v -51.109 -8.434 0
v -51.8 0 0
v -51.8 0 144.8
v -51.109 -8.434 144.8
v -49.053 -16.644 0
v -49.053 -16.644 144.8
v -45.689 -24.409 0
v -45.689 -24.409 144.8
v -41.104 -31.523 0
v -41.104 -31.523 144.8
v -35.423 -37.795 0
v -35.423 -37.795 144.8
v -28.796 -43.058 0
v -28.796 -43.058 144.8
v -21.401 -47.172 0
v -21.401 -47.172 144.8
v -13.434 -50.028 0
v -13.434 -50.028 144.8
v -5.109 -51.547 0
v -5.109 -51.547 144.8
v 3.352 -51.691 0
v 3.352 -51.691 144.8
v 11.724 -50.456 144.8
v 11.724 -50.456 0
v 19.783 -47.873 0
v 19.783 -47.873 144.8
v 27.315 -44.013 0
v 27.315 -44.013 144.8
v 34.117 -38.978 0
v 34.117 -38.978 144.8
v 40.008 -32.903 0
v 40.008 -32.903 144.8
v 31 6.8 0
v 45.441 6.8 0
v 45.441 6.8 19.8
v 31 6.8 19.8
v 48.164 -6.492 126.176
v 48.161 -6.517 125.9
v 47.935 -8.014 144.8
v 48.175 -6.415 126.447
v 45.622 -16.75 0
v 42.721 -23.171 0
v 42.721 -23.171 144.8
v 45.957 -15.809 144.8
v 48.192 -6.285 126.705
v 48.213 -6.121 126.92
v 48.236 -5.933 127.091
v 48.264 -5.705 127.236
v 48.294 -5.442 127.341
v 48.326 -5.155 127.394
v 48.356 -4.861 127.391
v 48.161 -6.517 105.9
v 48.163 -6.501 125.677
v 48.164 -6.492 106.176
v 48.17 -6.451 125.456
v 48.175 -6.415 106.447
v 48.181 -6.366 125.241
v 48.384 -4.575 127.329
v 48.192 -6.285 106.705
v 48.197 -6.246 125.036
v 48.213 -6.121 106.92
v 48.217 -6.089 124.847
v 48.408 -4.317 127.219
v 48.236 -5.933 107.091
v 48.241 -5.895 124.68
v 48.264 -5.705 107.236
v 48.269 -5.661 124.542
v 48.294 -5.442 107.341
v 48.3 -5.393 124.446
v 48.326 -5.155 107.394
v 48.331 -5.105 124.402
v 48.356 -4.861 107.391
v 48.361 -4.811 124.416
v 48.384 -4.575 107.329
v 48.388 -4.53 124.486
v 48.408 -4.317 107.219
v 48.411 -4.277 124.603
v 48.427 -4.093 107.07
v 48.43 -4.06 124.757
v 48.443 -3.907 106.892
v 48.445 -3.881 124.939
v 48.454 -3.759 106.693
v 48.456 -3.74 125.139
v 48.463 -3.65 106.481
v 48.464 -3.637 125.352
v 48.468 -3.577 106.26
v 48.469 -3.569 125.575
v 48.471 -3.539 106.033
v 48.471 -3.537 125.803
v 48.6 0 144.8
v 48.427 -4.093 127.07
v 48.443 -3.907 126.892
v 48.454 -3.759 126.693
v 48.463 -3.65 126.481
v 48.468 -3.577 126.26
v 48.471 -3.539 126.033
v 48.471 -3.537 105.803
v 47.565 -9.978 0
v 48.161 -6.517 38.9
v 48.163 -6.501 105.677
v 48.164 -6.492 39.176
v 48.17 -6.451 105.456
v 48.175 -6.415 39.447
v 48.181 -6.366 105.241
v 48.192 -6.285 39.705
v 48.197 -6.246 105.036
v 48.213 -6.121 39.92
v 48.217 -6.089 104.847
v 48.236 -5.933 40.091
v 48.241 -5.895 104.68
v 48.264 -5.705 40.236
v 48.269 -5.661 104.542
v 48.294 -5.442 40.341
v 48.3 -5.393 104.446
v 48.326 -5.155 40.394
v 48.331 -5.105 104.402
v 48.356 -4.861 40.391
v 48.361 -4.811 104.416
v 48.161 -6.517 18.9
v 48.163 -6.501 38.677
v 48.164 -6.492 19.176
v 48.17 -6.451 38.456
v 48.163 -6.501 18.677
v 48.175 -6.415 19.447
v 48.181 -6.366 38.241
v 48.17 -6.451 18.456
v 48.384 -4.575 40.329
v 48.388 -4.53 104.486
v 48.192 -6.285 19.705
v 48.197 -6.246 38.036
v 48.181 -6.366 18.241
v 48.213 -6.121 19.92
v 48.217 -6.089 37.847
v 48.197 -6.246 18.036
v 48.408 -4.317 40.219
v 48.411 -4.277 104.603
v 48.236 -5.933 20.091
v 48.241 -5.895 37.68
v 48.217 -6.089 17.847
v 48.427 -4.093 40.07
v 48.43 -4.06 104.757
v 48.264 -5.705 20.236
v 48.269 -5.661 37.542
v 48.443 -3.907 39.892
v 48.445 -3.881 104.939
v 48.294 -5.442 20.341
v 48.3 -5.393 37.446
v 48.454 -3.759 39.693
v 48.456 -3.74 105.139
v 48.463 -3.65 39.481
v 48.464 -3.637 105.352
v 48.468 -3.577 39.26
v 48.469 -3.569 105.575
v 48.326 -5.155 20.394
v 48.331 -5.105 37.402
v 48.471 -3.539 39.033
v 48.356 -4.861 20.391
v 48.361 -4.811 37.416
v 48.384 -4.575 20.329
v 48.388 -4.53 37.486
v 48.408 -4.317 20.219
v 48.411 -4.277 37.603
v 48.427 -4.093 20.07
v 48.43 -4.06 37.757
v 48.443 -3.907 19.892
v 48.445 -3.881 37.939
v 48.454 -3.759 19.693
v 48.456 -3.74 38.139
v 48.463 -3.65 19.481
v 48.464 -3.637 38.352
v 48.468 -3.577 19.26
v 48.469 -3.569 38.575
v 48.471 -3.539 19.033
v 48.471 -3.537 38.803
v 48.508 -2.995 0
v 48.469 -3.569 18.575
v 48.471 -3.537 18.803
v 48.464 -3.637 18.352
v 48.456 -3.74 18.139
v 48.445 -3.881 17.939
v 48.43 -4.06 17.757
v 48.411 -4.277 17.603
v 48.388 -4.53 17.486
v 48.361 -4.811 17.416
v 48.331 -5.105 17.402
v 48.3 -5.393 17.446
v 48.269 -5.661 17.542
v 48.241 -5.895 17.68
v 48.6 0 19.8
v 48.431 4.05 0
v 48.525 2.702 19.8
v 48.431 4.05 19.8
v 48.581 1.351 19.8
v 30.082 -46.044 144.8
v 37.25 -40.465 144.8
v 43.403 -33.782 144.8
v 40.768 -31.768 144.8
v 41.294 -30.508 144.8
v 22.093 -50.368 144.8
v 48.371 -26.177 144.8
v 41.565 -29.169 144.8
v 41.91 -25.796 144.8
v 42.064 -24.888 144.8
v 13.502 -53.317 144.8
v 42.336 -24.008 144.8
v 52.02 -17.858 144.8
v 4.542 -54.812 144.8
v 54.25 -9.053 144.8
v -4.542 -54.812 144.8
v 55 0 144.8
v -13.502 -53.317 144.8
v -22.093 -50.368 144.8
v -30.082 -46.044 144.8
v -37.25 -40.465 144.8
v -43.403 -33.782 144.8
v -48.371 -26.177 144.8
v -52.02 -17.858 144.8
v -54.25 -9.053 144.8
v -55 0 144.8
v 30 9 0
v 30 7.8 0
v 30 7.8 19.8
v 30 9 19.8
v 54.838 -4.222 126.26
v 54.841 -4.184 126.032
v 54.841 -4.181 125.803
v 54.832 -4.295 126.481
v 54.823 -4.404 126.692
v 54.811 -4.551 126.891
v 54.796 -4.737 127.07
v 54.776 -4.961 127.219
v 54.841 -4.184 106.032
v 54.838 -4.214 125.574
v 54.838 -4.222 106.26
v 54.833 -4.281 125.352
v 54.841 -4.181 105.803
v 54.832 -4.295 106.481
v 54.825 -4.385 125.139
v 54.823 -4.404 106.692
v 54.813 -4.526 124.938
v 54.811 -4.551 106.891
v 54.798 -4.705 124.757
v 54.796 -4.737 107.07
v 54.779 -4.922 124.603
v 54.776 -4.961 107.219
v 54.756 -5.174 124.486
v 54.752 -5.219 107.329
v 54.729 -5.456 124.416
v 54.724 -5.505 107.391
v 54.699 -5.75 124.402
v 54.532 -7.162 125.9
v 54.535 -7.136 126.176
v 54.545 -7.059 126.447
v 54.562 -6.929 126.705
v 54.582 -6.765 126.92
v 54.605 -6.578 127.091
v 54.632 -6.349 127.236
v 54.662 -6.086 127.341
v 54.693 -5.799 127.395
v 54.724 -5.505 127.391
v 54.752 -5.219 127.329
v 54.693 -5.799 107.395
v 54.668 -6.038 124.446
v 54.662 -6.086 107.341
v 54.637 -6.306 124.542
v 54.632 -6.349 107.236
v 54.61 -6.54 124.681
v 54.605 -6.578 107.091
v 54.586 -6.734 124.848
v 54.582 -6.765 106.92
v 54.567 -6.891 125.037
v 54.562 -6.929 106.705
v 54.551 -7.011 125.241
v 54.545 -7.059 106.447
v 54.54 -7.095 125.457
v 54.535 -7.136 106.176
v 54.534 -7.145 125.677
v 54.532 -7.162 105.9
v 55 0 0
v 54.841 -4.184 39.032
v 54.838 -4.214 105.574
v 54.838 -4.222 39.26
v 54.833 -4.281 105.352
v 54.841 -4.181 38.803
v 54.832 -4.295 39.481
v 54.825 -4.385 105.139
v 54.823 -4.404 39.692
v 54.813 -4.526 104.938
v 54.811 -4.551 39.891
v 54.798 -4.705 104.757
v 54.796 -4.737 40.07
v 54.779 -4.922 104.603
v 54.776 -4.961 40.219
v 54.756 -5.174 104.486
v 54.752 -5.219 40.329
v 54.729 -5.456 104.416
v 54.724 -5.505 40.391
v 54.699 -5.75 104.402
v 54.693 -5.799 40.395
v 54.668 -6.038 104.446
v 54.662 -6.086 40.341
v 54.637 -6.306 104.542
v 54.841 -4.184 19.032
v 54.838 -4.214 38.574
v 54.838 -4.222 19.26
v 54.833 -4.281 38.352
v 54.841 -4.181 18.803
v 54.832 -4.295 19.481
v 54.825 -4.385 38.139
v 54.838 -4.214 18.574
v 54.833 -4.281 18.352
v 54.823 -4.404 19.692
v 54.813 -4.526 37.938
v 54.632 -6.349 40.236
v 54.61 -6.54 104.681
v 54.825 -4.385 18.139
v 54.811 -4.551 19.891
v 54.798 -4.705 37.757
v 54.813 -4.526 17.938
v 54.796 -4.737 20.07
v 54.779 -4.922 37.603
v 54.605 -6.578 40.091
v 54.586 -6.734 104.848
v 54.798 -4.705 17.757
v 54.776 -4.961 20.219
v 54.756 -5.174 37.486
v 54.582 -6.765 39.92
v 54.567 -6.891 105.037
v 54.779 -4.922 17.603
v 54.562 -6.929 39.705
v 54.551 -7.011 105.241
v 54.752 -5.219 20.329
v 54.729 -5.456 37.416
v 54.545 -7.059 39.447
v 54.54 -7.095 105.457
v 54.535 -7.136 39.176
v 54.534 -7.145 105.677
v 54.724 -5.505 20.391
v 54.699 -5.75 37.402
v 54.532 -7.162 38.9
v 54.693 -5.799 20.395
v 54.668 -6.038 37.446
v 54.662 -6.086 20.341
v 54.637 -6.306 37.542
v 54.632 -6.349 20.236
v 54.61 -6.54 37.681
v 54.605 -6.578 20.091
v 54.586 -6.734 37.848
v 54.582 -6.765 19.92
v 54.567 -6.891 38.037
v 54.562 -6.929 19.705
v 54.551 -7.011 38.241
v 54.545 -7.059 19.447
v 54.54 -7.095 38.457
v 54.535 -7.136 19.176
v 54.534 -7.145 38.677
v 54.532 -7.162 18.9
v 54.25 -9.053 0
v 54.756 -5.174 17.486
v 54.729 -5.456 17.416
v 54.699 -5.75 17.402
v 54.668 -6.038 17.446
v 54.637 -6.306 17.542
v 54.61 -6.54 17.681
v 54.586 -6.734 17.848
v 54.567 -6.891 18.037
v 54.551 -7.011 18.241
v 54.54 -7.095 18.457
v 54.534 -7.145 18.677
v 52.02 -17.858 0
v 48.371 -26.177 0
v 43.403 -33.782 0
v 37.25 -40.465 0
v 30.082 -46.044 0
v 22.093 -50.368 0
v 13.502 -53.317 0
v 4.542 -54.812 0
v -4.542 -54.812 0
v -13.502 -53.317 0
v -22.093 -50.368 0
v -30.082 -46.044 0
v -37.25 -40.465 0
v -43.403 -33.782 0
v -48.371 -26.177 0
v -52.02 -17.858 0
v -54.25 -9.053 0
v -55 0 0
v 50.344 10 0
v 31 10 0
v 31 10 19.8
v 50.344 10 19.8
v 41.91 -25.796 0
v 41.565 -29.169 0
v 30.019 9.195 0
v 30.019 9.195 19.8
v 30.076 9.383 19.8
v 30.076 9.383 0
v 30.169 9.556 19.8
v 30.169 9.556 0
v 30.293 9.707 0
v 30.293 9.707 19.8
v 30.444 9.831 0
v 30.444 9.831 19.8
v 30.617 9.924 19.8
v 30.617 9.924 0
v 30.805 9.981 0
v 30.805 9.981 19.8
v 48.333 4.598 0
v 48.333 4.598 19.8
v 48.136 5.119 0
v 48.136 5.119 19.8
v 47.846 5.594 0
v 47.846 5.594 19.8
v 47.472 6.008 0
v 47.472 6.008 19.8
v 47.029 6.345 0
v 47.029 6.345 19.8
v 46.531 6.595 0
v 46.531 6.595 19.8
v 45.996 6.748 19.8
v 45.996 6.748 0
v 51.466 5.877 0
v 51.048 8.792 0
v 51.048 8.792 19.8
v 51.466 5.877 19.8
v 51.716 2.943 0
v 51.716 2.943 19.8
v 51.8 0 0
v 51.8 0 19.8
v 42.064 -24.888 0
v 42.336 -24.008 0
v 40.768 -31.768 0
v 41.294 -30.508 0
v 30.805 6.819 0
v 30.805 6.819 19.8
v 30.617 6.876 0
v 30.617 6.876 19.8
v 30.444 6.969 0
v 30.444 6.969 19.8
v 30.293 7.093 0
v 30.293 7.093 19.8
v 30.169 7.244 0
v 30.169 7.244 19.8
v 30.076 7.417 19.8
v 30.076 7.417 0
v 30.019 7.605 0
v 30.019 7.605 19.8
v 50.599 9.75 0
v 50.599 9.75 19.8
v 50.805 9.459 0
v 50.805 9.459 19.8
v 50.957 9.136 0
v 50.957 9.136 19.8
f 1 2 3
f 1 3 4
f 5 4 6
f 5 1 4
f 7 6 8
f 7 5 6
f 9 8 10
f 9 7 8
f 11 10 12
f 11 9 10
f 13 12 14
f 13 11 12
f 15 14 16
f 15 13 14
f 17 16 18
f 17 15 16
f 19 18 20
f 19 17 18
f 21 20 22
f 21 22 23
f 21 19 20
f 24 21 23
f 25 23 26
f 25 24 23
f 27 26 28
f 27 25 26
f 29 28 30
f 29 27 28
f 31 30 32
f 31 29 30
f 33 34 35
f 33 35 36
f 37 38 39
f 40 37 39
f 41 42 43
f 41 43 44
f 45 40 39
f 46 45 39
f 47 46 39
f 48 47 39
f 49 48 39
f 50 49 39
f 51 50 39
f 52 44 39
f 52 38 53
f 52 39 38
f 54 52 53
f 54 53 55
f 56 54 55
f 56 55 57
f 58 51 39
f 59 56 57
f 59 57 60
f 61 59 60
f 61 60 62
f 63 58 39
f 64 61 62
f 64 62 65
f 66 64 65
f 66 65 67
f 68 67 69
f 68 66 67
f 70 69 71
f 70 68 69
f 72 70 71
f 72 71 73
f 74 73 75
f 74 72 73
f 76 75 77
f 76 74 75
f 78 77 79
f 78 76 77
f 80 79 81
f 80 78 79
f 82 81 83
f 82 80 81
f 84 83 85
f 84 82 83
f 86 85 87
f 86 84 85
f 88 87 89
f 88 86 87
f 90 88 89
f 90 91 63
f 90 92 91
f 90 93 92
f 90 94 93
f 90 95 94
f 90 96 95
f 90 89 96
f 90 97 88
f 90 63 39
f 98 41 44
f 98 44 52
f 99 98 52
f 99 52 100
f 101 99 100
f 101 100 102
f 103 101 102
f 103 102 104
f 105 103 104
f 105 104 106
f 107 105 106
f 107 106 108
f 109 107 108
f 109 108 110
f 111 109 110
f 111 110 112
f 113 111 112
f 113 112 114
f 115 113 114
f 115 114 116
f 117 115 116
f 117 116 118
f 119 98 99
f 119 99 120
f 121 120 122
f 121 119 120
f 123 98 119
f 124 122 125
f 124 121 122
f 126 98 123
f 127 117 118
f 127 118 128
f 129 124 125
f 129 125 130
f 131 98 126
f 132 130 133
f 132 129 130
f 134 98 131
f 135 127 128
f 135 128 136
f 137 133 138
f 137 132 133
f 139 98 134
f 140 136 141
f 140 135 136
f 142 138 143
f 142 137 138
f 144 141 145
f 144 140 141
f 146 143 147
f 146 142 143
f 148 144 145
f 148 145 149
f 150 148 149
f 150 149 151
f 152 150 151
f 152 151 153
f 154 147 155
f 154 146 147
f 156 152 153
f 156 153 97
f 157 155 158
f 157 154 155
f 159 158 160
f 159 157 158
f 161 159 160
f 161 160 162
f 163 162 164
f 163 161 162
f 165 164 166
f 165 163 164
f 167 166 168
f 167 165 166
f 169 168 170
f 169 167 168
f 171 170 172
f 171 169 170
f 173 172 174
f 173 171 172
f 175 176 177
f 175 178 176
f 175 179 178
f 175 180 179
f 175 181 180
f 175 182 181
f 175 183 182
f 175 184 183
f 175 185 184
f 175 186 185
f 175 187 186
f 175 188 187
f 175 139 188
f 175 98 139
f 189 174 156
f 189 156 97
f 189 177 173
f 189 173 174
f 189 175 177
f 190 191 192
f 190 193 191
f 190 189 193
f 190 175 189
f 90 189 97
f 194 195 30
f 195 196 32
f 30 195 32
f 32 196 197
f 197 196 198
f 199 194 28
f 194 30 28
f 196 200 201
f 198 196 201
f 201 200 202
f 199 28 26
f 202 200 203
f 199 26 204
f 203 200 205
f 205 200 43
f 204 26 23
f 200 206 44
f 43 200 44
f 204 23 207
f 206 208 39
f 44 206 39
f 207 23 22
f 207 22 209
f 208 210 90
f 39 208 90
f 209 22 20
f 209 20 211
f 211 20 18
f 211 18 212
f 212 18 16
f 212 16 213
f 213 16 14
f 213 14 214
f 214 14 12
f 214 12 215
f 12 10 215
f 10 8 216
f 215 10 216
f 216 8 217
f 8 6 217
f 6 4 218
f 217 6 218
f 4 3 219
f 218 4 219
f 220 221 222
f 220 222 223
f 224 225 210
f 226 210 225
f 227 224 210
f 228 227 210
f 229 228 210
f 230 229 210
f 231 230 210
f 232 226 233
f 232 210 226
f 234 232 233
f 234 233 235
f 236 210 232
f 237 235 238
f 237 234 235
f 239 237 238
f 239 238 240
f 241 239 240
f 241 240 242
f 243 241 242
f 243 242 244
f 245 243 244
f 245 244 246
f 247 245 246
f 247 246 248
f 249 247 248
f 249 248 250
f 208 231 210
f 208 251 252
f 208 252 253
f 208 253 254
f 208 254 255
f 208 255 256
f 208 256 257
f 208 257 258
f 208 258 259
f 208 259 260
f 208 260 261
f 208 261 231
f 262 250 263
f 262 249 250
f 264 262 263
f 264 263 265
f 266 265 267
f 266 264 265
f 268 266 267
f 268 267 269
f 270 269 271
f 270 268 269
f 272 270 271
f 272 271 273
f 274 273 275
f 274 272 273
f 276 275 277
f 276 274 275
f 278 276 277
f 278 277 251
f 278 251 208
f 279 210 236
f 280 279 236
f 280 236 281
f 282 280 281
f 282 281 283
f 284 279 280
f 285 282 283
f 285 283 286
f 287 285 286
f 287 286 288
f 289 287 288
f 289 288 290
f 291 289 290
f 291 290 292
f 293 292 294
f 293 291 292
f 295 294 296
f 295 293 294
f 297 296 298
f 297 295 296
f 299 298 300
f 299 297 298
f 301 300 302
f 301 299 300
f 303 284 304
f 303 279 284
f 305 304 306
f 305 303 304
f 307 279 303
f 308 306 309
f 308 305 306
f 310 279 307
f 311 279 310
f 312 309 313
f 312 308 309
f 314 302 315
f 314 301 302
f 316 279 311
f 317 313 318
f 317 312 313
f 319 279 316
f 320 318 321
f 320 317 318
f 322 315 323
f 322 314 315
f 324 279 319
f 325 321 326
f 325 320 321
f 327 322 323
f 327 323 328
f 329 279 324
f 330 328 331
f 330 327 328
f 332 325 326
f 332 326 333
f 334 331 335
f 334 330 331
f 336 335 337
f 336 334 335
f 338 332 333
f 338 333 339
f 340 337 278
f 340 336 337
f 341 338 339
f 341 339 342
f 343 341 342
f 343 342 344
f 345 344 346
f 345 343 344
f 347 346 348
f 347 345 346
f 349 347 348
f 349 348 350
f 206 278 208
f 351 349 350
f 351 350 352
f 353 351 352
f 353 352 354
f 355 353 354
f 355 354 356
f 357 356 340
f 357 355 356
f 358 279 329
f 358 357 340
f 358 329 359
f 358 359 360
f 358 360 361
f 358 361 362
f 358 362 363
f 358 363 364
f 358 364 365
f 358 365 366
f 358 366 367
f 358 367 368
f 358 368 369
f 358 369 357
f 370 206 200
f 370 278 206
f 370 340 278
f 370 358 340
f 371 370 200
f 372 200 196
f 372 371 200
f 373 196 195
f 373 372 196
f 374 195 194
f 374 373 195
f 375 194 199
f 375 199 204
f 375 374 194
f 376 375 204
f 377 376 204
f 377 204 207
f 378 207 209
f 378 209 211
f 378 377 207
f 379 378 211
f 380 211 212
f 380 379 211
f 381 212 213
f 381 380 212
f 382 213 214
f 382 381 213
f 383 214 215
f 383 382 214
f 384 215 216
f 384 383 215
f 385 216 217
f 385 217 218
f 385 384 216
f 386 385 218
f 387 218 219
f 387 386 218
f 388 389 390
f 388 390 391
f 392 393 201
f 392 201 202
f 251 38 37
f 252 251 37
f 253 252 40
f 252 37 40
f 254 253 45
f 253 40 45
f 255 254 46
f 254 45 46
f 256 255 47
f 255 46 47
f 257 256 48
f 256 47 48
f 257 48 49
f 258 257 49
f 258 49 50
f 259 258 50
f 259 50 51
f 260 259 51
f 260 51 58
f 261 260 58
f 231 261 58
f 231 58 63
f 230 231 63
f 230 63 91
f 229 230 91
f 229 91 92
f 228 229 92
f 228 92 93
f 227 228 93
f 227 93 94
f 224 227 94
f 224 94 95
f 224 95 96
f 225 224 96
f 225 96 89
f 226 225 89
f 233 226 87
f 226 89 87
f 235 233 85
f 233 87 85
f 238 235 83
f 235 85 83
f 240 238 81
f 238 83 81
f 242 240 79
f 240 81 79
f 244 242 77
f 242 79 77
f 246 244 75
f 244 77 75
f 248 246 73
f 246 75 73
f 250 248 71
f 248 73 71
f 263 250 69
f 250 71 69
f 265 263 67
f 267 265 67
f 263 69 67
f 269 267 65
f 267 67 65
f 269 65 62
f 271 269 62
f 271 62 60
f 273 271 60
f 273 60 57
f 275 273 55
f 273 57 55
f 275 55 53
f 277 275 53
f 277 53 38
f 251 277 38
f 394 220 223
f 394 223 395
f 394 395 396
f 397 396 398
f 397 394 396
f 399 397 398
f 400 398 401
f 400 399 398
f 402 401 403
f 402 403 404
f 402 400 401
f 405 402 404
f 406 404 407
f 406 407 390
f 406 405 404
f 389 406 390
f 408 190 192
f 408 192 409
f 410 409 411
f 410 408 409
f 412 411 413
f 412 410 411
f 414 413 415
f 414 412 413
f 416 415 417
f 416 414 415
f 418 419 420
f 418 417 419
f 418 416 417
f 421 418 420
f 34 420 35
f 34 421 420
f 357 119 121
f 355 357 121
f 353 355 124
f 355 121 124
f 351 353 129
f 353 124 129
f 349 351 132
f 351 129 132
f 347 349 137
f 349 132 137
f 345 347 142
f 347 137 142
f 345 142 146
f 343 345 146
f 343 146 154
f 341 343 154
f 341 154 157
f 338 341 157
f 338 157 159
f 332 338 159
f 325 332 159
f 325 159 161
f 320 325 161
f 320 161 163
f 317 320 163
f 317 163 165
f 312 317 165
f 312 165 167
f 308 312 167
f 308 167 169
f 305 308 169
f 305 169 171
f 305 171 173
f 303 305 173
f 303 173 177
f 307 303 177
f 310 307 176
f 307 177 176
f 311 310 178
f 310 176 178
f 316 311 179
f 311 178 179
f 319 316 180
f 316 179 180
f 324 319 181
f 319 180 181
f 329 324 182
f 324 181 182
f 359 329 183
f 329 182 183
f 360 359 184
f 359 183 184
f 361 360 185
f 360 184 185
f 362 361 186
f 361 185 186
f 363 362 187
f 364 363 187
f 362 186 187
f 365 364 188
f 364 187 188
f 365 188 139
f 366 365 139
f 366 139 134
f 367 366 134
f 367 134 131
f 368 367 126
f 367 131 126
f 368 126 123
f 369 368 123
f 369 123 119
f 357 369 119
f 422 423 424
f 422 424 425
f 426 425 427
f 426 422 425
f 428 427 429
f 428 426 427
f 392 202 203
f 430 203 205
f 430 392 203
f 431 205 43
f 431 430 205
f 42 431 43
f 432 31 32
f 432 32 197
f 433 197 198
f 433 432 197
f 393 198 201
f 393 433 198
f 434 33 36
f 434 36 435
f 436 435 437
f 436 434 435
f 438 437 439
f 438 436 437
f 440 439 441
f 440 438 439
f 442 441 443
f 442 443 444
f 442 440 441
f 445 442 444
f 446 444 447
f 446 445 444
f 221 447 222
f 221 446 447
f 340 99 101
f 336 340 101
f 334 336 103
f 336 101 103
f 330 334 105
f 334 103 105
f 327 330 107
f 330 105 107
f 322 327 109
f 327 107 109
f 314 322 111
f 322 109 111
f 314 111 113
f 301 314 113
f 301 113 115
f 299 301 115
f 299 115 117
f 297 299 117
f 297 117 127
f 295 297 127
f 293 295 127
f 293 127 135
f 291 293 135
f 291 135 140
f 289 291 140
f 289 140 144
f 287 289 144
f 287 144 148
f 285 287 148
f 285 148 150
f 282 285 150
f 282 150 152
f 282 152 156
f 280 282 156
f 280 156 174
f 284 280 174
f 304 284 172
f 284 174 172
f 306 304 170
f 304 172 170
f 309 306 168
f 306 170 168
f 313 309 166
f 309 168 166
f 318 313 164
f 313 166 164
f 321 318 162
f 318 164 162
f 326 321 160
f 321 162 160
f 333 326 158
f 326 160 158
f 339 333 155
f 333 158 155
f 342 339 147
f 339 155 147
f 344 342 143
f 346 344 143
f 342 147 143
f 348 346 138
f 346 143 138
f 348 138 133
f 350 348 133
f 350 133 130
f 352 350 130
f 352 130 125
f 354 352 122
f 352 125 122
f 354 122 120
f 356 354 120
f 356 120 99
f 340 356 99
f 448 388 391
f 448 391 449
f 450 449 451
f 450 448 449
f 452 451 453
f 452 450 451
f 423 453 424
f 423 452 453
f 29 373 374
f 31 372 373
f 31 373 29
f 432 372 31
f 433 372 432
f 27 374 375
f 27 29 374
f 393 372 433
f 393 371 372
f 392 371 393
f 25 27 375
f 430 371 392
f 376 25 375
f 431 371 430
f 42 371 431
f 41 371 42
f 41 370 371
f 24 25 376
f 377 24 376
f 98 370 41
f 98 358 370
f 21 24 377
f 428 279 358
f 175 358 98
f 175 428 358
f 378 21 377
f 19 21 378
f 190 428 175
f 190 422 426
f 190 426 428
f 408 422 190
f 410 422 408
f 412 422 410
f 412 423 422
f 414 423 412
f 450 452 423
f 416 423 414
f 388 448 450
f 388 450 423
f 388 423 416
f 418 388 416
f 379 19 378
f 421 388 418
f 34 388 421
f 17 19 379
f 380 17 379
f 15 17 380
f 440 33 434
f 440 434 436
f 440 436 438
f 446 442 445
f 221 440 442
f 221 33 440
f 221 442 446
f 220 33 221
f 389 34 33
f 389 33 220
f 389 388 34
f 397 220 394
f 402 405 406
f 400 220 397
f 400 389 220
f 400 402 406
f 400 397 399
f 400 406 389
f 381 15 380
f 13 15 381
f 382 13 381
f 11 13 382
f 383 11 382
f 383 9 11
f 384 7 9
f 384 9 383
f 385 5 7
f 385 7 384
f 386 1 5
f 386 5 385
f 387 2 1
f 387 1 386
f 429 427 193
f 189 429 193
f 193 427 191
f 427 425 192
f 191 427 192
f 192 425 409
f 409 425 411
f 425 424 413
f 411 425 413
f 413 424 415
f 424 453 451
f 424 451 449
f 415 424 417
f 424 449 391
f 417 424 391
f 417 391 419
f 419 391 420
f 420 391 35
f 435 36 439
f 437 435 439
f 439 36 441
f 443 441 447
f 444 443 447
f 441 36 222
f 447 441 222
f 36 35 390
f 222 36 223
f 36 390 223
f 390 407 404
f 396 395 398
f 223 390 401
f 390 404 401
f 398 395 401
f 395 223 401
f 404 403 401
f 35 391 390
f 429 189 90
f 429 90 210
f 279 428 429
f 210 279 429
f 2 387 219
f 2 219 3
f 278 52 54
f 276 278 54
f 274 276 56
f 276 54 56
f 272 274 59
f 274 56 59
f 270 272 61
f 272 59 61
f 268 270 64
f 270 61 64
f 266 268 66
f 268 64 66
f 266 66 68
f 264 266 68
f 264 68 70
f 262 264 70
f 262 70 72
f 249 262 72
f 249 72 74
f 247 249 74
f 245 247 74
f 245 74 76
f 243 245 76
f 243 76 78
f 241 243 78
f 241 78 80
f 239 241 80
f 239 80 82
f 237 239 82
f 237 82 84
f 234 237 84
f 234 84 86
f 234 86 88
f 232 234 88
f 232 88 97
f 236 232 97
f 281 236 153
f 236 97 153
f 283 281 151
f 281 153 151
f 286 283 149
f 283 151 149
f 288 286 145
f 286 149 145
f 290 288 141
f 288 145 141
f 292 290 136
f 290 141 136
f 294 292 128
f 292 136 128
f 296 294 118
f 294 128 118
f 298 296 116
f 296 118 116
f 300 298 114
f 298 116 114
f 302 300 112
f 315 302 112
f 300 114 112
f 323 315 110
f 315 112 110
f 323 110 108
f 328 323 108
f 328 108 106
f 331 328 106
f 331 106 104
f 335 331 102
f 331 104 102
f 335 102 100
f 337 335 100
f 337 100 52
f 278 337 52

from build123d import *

# Parameters (mm, degrees)
EXTRUDE_1_DEPTH     = 144.8
SKETCH_7_R          = 1.5
CUT_EXTRUDE_6_DEPTH = 80
CUT_EXTRUDE_START   = -125
CUT_EXTRUDE_8_DEPTH = 125


with BuildPart() as part:
    # 草图1 → 凸台-拉伸1 (new body)
    with BuildSketch(Plane.XY):
        with BuildLine():
            Line((-55, 0), (-51.8, 0))
            ThreePointArc((-51.8, 0), (-17.476086779, -48.76296126), (40.00796876, -32.902924425))
            ThreePointArc((40.00796876, -32.902924425), (41.062164054, -31.150956215), (41.565129022, -29.16910189))
            Line((41.565129022, -29.16910189), (41.910264928, -25.795992674))
            ThreePointArc((41.910264928, -25.795992674), (42.185460224, -24.44340265), (42.720717667, -23.171108779))
            ThreePointArc((42.720717667, -23.171108779), (47.564735827, -9.977770578), (48.43095601, 4.05))
            ThreePointArc((48.43095601, 4.05), (47.472400425, 6.007940217), (45.441390824, 6.8))
            Line((45.441390824, 6.8), (31, 6.8))
            ThreePointArc((31, 6.8), (30.292893219, 7.092893219), (30, 7.8))
            Line((30, 7.8), (30, 9))
            ThreePointArc((30, 9), (30.292893219, 9.707106781), (31, 10))
            Line((31, 10), (50.344019583, 10))
            ThreePointArc((50.344019583, 10), (50.805346897, 9.459374484), (51.0484918, 8.791557597))
            ThreePointArc((51.0484918, 8.791557597), (51.611780996, 4.411809423), (51.8, 0))
            Line((51.8, 0), (55, 0))
            ThreePointArc((55, 0), (0, -55), (-55, 0))
        make_face()
    extrude(amount=EXTRUDE_1_DEPTH)

    # 草图7 → 切除-拉伸6 (cut)
    with BuildSketch(Plane(origin=(0, 0, 0), x_dir=(0.10066073352284005, 0.994920809274107, 0), z_dir=(-0.9949208092741069, 0.10066073352284004, 0))):
        with Locations(Location((-0.136340344, -18.9, 0), (0, 0, 180))):
            Circle(SKETCH_7_R)
        with Locations(Location((-0.136340344, -38.9, 0), (0, 0, 180))):
            Circle(SKETCH_7_R)
        with Locations(Location((-0.136340344, -105.9, 0), (0, 0, 180))):
            Circle(SKETCH_7_R)
        with Locations(Location((-0.136340344, -125.9, 0), (0, 0, 180))):
            Circle(SKETCH_7_R)
    extrude(amount=-CUT_EXTRUDE_6_DEPTH, mode=Mode.SUBTRACT)

    # 草图4 → 切除-拉伸8 (cut)
    with BuildSketch(Plane.XY.offset(144.8).offset(CUT_EXTRUDE_START)):
        with BuildLine():
            Line((55, 0), (0, 0))
            Line((0, 0), (50.016978469, 22.875792113))
            ThreePointArc((50.016978469, 22.875792113), (53.739807479, 11.70611345), (55, 0))
        make_face()
    extrude(amount=CUT_EXTRUDE_8_DEPTH, mode=Mode.SUBTRACT)


solid = part.part
